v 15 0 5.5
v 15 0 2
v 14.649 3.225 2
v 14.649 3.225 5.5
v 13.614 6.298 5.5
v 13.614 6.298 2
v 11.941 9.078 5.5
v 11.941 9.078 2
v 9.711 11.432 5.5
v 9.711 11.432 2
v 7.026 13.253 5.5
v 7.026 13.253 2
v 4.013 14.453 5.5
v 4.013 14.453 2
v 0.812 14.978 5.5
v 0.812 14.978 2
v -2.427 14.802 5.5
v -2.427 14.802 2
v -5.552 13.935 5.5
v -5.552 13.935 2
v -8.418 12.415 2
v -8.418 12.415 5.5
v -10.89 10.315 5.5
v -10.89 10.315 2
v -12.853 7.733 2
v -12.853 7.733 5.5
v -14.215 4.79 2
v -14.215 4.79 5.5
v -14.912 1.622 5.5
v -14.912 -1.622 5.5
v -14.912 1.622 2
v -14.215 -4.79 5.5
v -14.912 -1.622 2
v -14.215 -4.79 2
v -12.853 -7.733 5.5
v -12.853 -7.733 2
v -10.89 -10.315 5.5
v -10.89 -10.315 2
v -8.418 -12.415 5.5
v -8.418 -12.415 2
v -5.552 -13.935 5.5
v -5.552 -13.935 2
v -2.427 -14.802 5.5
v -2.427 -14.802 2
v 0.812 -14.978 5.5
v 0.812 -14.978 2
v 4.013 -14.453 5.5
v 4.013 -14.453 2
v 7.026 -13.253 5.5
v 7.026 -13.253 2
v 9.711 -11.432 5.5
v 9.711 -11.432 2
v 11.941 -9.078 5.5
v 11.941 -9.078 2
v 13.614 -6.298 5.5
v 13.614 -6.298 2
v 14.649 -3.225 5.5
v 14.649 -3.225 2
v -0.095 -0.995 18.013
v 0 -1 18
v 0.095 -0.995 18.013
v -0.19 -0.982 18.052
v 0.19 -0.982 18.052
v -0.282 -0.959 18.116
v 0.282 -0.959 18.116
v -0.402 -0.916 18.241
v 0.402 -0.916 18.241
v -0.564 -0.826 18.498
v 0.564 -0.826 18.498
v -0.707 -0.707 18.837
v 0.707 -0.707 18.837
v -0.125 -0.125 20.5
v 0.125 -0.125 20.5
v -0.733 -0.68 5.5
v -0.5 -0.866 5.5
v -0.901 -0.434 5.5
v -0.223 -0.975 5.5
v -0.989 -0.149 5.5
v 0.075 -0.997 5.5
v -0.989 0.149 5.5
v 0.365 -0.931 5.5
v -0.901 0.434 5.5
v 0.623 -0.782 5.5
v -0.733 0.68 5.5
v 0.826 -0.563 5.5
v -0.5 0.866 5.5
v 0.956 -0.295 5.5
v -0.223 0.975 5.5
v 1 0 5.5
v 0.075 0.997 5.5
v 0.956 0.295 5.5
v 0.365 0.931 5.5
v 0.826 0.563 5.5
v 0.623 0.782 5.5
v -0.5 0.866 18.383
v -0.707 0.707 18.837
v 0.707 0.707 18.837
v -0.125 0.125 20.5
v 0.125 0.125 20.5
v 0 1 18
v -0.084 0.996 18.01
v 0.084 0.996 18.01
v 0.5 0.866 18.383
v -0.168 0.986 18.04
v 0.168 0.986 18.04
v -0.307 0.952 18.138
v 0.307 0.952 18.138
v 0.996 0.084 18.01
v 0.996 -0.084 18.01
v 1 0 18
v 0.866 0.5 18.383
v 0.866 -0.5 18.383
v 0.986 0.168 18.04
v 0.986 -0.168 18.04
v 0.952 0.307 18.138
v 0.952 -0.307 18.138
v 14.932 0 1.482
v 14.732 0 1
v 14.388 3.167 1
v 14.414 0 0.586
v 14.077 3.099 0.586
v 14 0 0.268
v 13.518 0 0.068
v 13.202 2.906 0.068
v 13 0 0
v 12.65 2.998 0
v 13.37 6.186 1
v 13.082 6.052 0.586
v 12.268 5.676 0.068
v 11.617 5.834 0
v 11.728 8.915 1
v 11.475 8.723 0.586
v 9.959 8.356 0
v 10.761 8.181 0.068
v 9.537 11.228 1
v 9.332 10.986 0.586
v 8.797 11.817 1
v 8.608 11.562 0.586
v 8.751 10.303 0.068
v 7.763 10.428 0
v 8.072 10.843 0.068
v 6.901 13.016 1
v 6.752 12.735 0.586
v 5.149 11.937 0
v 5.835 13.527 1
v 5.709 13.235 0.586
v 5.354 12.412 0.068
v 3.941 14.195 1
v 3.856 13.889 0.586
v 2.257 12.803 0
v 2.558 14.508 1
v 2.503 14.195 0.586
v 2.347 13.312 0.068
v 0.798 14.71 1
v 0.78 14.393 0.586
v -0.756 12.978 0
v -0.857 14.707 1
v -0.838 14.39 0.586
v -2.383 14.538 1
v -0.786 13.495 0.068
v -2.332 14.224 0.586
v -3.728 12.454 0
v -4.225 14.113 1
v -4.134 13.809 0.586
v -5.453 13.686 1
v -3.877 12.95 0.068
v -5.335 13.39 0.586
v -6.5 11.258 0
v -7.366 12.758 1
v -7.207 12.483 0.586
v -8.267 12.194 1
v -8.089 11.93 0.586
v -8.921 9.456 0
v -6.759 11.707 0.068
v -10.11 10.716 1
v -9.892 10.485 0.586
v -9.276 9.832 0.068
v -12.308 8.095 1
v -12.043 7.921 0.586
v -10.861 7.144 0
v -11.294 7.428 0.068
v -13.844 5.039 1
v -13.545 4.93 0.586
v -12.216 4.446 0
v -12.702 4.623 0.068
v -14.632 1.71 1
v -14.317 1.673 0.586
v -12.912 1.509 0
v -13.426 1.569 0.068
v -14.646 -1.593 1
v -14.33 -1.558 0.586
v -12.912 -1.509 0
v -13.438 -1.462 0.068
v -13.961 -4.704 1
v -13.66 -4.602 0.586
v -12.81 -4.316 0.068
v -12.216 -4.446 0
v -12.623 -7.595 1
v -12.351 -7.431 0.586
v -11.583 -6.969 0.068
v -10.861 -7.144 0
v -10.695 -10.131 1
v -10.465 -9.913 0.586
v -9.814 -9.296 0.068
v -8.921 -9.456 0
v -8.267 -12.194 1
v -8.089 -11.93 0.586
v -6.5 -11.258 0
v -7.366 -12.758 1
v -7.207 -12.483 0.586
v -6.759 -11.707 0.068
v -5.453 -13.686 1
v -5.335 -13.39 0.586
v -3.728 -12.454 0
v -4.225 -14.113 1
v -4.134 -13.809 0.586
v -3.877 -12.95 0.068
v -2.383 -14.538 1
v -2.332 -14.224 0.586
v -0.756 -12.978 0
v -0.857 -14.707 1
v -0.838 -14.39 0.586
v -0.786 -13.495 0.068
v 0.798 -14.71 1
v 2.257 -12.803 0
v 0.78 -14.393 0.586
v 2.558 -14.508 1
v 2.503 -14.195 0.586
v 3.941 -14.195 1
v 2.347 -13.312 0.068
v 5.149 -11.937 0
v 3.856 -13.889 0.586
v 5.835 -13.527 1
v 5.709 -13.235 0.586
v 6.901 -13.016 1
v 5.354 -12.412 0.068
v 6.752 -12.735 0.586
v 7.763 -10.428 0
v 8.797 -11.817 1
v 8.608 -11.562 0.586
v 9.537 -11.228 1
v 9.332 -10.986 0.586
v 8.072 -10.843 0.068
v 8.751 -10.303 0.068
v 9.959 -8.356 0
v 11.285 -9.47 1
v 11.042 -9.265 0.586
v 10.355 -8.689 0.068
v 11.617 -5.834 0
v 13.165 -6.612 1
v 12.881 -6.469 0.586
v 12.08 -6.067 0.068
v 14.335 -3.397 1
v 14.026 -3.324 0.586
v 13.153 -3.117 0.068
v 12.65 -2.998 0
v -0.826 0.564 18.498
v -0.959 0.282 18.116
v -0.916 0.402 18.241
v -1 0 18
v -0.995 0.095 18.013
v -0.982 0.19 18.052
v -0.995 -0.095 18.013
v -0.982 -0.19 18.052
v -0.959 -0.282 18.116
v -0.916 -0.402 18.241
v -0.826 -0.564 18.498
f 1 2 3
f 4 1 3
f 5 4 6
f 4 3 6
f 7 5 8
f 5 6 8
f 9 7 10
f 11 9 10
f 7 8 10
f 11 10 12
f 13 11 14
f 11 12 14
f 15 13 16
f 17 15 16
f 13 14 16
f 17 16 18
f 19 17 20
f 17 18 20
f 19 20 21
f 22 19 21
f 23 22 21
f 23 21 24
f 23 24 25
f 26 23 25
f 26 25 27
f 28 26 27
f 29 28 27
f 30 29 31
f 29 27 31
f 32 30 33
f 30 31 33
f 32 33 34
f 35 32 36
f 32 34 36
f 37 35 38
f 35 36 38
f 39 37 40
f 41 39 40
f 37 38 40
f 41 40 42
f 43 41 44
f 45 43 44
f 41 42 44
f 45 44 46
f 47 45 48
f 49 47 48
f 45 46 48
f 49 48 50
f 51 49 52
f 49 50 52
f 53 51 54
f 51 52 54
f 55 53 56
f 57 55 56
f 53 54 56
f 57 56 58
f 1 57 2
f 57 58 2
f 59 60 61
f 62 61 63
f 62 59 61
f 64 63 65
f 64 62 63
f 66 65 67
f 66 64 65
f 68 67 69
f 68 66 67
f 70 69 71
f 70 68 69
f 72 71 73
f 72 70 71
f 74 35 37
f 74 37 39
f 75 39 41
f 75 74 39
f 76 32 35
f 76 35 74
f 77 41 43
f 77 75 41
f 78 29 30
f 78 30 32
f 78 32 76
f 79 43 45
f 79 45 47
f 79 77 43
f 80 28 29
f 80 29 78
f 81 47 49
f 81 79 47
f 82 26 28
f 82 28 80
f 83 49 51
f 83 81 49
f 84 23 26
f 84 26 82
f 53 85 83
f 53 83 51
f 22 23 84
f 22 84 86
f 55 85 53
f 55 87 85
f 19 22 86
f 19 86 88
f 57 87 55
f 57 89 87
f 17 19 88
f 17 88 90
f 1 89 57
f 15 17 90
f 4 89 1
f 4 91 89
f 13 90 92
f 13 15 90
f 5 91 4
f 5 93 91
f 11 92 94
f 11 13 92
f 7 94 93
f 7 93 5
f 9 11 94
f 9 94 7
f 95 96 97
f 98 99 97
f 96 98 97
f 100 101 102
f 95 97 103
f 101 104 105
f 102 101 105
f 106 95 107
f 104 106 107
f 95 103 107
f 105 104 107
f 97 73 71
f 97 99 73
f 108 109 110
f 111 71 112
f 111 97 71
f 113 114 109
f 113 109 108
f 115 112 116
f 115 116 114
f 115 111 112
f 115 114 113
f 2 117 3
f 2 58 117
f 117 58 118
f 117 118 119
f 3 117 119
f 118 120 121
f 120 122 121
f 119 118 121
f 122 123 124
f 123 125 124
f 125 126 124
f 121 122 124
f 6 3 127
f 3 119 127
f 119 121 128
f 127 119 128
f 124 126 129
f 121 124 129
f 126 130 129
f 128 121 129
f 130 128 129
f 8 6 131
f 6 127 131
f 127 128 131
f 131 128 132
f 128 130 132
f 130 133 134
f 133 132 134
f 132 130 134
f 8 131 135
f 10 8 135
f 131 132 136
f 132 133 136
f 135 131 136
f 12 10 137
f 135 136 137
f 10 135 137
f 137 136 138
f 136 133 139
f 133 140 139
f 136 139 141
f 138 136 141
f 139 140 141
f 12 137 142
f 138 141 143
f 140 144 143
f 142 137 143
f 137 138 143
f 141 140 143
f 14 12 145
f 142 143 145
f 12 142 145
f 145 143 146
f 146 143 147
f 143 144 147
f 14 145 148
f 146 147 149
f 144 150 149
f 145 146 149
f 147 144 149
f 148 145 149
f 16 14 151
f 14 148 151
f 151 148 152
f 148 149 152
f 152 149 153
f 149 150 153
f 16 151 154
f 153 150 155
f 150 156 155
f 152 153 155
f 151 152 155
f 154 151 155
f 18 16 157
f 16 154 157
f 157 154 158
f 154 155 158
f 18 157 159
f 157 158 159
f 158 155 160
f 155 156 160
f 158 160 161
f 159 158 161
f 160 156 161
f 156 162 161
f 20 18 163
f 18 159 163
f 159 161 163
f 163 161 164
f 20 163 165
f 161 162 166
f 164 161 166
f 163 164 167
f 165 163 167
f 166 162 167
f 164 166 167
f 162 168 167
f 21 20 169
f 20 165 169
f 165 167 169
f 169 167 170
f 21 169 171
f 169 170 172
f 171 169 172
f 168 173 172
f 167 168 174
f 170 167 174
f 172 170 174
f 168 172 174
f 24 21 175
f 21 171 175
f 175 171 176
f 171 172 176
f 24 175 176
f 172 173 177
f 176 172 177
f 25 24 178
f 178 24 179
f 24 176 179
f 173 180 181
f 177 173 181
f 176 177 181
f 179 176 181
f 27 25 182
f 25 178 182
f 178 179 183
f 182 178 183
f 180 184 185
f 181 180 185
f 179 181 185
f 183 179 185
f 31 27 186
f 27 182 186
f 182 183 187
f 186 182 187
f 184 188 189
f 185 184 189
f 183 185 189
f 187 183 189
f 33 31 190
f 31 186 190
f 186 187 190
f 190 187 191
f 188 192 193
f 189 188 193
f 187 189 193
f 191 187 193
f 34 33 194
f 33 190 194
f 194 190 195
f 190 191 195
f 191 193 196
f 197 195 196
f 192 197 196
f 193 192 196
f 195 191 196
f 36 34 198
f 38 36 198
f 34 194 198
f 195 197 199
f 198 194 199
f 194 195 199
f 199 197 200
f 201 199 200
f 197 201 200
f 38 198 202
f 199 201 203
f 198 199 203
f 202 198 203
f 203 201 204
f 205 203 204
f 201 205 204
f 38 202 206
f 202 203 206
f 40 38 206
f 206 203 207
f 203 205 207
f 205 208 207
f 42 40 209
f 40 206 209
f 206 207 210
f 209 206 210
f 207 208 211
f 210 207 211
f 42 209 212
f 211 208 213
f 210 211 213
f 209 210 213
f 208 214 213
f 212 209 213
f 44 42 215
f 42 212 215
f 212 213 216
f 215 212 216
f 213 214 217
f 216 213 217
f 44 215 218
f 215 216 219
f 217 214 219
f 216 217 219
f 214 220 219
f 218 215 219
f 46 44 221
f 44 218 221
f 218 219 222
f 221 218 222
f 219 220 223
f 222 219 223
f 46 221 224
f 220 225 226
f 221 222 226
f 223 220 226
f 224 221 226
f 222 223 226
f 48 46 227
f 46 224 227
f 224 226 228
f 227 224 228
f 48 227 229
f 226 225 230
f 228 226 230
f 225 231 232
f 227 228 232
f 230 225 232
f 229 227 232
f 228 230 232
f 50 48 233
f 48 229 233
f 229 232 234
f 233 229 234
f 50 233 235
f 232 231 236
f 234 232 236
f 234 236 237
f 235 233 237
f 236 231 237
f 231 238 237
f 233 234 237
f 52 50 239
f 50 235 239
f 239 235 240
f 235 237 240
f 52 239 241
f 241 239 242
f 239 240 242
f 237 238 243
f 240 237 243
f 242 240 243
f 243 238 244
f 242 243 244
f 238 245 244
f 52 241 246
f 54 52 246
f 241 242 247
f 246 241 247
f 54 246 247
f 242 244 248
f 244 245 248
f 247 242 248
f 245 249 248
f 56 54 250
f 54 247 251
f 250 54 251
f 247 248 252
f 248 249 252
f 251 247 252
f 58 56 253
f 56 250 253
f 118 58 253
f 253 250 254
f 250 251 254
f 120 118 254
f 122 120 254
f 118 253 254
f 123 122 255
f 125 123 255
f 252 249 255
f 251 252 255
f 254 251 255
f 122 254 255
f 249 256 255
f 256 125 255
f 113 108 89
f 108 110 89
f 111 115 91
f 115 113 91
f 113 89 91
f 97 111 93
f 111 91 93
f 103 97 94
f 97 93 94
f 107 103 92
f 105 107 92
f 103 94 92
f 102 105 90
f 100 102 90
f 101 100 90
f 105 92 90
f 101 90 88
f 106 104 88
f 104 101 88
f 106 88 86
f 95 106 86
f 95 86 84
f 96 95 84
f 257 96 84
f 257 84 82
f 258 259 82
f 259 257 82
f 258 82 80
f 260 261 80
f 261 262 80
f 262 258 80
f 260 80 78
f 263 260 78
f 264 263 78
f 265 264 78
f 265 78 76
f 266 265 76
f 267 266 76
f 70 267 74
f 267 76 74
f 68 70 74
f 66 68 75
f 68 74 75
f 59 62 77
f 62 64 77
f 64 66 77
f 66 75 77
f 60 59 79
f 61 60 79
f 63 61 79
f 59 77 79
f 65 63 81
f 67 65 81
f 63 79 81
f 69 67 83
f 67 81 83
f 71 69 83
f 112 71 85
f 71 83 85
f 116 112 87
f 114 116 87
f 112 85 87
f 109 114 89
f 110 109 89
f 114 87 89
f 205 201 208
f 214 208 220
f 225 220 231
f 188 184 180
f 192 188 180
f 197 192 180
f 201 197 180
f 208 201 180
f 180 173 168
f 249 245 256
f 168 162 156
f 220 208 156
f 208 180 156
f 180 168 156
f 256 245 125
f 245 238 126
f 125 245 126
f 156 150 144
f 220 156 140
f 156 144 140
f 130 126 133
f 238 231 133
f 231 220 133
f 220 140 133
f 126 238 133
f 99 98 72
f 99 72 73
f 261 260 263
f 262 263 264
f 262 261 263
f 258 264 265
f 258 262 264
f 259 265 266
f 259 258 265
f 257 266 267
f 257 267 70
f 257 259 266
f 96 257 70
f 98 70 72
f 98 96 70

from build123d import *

# Parameters (mm, degrees)
F0_R          = 15
F1_DEPTH      = 5.5
F2_R          = 2
F3_R          = 1
F4_DEPTH      = 15
F6_DEPTH      = 15.001
F6_DEPTH_BACK = 15.001
F8_DEPTH      = 15.001
F8_DEPTH_BACK = 15.001


with BuildPart() as f1:
    # F0 (on Top) → F1 (new body)
    with BuildSketch(Plane.XY):
        Circle(F0_R)
    extrude(amount=F1_DEPTH)

    # F2
    f2_edges = [f1.edges().sort_by_distance(p)[0] for p in [
        (-15, 0, 0),
    ]]
    fillet(f2_edges, radius=F2_R)

    # F3 (on face) → F4 (join)
    with BuildSketch(Plane.XY.offset(5.5)):
        Circle(F3_R)
    extrude(amount=F4_DEPTH)

    # F5 (on Front) → F6 (cut, two sides)
    with BuildSketch(Plane.XZ) as f6_sk:
        Polygon((1, 20.5), (0.125, 20.5), (1, 18), align=None)
        Polygon((-0.125, 20.5), (-1, 20.5), (-1, 18), align=None)
    extrude(amount=-F6_DEPTH, mode=Mode.SUBTRACT)
    extrude(f6_sk.sketch, amount=F6_DEPTH_BACK, mode=Mode.SUBTRACT)

    # F7 (on Right) → F8 (cut, two sides)
    with BuildSketch(Plane.YZ) as f8_sk:
        Polygon((-0.9921567416, 20.5), (-1, 20.5), (-1, 18), (-0.125, 20.5), align=None)
        Polygon((1, 20.5), (0.9921567416, 20.5), (0.125, 20.5), (1, 18), align=None)
    extrude(amount=F8_DEPTH, mode=Mode.SUBTRACT)
    extrude(f8_sk.sketch, amount=-F8_DEPTH_BACK, mode=Mode.SUBTRACT)


solid = f1.part
